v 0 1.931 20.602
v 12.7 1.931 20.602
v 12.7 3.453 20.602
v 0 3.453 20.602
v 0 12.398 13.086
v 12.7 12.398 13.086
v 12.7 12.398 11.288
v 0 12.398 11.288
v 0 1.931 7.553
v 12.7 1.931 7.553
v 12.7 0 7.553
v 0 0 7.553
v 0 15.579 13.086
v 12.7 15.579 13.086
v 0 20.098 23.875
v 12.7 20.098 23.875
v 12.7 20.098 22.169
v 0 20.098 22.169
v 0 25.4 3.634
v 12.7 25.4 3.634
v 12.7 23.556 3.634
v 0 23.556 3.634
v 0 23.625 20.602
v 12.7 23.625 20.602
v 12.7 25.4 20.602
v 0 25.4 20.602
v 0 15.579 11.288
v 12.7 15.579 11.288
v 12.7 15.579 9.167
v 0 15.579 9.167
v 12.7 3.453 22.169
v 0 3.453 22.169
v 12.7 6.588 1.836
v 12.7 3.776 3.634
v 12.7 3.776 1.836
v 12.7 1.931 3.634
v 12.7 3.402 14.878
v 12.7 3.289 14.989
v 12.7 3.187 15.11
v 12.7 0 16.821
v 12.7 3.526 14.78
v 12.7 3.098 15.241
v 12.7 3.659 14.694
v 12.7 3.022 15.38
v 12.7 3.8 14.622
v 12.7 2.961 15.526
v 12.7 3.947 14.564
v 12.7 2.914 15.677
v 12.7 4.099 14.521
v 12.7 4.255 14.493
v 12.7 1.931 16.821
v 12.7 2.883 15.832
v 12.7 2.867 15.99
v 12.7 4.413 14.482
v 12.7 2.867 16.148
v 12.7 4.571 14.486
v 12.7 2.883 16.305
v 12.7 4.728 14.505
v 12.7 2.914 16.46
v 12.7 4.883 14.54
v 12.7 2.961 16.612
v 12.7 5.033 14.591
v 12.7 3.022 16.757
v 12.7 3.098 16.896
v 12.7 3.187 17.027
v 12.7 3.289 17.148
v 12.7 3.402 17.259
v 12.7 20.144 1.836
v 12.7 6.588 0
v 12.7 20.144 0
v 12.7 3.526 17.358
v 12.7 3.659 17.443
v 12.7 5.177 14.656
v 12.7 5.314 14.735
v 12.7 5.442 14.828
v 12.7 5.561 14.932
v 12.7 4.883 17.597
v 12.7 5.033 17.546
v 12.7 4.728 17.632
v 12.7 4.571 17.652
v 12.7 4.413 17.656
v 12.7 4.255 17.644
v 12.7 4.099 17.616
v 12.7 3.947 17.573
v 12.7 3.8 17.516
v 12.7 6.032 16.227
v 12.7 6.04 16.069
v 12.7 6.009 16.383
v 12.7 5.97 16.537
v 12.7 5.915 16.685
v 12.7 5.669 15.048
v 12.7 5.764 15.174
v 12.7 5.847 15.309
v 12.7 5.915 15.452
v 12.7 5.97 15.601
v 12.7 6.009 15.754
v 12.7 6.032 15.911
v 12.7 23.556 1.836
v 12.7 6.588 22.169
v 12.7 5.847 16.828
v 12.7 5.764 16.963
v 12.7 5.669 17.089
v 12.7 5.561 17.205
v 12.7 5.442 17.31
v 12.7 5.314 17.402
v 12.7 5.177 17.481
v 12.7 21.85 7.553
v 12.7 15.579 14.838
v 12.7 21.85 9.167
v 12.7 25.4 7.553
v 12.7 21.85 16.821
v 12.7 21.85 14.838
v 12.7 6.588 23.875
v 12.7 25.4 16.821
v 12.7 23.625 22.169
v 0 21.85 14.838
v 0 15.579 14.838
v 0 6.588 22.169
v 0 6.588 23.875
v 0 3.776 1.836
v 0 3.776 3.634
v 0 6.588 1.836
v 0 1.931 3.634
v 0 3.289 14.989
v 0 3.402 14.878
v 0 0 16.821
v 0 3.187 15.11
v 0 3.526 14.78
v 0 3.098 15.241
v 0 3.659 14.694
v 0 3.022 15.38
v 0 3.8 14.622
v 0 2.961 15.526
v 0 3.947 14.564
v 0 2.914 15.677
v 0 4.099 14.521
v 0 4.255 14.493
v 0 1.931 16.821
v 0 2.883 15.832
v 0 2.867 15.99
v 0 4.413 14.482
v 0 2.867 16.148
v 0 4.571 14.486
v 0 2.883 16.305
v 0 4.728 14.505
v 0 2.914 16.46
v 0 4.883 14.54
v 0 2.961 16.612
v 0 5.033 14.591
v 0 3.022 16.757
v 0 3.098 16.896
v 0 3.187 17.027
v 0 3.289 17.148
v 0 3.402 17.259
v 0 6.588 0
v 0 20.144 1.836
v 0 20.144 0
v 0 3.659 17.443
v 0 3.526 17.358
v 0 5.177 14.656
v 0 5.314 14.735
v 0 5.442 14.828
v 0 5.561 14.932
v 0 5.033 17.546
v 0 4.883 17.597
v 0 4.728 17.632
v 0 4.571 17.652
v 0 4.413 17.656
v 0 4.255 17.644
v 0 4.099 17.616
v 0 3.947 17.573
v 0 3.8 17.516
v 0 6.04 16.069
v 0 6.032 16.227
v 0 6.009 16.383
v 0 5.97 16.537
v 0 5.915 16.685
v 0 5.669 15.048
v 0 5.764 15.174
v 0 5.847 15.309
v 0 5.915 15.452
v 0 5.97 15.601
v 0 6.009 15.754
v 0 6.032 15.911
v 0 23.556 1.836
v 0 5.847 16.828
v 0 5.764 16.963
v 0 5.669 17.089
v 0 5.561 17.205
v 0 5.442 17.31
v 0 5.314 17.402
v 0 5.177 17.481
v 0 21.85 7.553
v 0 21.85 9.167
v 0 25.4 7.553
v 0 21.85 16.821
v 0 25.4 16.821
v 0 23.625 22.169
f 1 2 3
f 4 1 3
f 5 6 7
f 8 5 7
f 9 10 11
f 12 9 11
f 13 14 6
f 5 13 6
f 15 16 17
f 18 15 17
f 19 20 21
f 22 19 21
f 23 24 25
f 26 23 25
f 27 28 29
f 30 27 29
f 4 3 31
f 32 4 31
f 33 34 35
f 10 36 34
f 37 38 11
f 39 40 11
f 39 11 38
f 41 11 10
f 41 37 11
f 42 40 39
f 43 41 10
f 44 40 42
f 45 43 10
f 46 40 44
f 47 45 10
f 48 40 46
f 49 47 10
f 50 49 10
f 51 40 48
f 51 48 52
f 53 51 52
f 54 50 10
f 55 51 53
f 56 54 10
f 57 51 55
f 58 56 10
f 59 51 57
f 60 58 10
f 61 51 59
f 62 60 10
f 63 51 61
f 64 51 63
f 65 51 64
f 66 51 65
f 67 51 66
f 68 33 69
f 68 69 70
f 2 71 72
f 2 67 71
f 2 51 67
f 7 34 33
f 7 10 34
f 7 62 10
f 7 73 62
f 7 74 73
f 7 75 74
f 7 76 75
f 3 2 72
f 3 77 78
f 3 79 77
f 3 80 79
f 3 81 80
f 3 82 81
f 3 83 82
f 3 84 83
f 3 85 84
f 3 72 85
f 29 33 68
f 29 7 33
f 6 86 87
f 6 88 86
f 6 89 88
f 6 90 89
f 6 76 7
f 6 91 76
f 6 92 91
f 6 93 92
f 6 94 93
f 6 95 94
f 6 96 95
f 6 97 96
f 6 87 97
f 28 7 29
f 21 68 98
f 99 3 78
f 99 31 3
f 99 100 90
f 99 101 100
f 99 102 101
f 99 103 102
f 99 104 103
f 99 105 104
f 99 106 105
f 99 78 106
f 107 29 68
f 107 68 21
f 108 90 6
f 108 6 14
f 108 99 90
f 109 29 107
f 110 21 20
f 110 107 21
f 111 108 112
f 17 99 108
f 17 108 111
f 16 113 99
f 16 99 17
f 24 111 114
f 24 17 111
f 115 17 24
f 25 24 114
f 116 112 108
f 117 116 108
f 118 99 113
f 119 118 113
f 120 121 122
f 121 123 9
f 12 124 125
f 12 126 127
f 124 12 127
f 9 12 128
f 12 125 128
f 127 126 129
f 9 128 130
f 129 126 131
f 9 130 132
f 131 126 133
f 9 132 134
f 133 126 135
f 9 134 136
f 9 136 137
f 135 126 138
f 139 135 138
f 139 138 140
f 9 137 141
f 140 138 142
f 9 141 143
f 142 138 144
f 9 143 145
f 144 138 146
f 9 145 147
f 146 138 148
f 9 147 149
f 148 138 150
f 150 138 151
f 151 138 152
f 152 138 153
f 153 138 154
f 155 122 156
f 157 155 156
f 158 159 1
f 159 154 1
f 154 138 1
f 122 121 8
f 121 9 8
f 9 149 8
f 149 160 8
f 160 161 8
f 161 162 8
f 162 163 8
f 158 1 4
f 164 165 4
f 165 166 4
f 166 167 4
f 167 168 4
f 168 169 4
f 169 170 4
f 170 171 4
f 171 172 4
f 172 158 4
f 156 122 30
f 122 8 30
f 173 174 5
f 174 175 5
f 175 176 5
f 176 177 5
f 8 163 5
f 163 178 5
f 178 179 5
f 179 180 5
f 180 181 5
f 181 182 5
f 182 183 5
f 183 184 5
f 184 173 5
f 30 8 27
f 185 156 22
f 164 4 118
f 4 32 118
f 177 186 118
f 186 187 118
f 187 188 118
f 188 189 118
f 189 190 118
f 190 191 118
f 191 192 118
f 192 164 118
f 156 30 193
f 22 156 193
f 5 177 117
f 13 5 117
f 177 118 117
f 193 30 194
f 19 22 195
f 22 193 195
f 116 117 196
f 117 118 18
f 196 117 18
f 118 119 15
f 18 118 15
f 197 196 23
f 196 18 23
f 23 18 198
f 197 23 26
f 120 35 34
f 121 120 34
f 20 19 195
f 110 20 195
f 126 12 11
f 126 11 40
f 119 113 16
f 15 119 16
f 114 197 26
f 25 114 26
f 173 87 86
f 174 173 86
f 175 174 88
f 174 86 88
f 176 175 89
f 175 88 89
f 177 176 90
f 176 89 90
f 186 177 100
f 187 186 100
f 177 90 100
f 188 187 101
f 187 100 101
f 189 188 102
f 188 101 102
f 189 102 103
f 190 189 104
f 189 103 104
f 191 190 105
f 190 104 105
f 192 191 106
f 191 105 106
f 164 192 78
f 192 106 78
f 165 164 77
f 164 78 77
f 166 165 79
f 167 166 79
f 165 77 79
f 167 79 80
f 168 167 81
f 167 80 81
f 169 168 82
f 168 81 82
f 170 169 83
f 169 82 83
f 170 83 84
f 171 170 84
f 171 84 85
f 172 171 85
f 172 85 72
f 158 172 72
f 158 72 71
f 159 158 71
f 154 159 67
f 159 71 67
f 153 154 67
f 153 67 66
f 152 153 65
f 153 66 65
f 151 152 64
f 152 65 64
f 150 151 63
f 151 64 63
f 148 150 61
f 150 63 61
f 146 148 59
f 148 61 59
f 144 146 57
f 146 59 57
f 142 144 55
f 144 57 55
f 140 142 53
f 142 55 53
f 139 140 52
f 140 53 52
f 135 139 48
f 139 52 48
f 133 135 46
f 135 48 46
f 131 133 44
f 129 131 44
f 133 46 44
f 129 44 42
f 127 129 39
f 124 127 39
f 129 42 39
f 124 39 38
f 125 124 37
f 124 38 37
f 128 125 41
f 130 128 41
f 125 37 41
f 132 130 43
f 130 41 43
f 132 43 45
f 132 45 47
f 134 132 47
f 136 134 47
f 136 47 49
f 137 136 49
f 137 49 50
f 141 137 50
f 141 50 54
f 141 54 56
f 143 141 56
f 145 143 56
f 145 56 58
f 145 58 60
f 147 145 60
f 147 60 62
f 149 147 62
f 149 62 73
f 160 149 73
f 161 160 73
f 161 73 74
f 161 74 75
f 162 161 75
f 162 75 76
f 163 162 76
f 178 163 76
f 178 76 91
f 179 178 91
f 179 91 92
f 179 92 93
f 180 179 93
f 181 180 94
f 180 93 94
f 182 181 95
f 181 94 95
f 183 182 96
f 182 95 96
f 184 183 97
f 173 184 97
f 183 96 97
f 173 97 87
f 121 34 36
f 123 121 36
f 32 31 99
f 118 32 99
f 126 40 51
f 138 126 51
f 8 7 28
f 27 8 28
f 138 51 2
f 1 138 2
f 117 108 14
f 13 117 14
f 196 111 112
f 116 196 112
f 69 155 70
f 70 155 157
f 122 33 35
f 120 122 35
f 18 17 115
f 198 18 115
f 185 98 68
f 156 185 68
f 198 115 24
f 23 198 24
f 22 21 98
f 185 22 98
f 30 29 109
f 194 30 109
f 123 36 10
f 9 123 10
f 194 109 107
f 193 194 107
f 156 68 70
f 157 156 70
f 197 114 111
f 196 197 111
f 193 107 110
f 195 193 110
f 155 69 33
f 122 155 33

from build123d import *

# Parameters (mm, degrees)
F0_W     = 25.4
F0_H     = 25.399998
F1_DEPTH = 12.7
F3_DEPTH = 25.4
F4_R     = 1.5875
F5_DEPTH = 12.7


with BuildPart() as f1:
    # F0 (on Right) → F1 (new body)
    with BuildSketch(Plane.YZ):
        with Locations((12.7, 12.699999)):
            Rectangle(F0_W, F0_H)
    extrude(amount=F1_DEPTH)

    # F2 (on face) → F3 (cut)
    with BuildSketch(Plane.YZ.offset(12.7)):
        Polygon((0, 25.399998), (0, 16.820697), (1.931377, 16.820697), (1.931377, 20.601515), (3.452925, 20.601515), (3.452925, 22.169169), (6.588236, 22.169169), (6.588236, 23.875147), (20.09774, 23.875147), (20.09774, 22.169169), (23.624913, 22.169169), (23.624913, 20.601515), (25.4, 20.601515), (25.4, 25.399998), align=None)
        Polygon((0, 0), (6.588236, 0), (6.588236, 1.835753), (3.775678, 1.835753), (3.775678, 3.633947), (1.931377, 3.633947), (1.931377, 7.553086), (0, 7.553086), align=None)
        Polygon((20.143846, 1.835753), (20.143846, 0), (25.4, 0), (25.4, 3.633947), (23.555804, 3.633947), (23.555804, 1.835753), align=None)
        Polygon((21.849825, 7.553086), (25.4, 7.553086), (25.4, 16.820697), (21.849825, 16.820697), (21.849825, 14.838074), (15.579202, 14.838074), (15.579202, 13.085988), (12.397784, 13.085988), (12.397784, 11.287794), (15.579202, 11.287794), (15.579202, 9.166849), (21.849825, 9.166849), align=None)
    extrude(amount=-F3_DEPTH, mode=Mode.SUBTRACT)

    # F4 (on face) → F5 (cut)
    with BuildSketch(Plane.YZ.offset(12.7)):
        with Locations((4.452611, 16.06866)):
            Circle(F4_R)
    extrude(amount=-F5_DEPTH, mode=Mode.SUBTRACT)


solid = f1.part
